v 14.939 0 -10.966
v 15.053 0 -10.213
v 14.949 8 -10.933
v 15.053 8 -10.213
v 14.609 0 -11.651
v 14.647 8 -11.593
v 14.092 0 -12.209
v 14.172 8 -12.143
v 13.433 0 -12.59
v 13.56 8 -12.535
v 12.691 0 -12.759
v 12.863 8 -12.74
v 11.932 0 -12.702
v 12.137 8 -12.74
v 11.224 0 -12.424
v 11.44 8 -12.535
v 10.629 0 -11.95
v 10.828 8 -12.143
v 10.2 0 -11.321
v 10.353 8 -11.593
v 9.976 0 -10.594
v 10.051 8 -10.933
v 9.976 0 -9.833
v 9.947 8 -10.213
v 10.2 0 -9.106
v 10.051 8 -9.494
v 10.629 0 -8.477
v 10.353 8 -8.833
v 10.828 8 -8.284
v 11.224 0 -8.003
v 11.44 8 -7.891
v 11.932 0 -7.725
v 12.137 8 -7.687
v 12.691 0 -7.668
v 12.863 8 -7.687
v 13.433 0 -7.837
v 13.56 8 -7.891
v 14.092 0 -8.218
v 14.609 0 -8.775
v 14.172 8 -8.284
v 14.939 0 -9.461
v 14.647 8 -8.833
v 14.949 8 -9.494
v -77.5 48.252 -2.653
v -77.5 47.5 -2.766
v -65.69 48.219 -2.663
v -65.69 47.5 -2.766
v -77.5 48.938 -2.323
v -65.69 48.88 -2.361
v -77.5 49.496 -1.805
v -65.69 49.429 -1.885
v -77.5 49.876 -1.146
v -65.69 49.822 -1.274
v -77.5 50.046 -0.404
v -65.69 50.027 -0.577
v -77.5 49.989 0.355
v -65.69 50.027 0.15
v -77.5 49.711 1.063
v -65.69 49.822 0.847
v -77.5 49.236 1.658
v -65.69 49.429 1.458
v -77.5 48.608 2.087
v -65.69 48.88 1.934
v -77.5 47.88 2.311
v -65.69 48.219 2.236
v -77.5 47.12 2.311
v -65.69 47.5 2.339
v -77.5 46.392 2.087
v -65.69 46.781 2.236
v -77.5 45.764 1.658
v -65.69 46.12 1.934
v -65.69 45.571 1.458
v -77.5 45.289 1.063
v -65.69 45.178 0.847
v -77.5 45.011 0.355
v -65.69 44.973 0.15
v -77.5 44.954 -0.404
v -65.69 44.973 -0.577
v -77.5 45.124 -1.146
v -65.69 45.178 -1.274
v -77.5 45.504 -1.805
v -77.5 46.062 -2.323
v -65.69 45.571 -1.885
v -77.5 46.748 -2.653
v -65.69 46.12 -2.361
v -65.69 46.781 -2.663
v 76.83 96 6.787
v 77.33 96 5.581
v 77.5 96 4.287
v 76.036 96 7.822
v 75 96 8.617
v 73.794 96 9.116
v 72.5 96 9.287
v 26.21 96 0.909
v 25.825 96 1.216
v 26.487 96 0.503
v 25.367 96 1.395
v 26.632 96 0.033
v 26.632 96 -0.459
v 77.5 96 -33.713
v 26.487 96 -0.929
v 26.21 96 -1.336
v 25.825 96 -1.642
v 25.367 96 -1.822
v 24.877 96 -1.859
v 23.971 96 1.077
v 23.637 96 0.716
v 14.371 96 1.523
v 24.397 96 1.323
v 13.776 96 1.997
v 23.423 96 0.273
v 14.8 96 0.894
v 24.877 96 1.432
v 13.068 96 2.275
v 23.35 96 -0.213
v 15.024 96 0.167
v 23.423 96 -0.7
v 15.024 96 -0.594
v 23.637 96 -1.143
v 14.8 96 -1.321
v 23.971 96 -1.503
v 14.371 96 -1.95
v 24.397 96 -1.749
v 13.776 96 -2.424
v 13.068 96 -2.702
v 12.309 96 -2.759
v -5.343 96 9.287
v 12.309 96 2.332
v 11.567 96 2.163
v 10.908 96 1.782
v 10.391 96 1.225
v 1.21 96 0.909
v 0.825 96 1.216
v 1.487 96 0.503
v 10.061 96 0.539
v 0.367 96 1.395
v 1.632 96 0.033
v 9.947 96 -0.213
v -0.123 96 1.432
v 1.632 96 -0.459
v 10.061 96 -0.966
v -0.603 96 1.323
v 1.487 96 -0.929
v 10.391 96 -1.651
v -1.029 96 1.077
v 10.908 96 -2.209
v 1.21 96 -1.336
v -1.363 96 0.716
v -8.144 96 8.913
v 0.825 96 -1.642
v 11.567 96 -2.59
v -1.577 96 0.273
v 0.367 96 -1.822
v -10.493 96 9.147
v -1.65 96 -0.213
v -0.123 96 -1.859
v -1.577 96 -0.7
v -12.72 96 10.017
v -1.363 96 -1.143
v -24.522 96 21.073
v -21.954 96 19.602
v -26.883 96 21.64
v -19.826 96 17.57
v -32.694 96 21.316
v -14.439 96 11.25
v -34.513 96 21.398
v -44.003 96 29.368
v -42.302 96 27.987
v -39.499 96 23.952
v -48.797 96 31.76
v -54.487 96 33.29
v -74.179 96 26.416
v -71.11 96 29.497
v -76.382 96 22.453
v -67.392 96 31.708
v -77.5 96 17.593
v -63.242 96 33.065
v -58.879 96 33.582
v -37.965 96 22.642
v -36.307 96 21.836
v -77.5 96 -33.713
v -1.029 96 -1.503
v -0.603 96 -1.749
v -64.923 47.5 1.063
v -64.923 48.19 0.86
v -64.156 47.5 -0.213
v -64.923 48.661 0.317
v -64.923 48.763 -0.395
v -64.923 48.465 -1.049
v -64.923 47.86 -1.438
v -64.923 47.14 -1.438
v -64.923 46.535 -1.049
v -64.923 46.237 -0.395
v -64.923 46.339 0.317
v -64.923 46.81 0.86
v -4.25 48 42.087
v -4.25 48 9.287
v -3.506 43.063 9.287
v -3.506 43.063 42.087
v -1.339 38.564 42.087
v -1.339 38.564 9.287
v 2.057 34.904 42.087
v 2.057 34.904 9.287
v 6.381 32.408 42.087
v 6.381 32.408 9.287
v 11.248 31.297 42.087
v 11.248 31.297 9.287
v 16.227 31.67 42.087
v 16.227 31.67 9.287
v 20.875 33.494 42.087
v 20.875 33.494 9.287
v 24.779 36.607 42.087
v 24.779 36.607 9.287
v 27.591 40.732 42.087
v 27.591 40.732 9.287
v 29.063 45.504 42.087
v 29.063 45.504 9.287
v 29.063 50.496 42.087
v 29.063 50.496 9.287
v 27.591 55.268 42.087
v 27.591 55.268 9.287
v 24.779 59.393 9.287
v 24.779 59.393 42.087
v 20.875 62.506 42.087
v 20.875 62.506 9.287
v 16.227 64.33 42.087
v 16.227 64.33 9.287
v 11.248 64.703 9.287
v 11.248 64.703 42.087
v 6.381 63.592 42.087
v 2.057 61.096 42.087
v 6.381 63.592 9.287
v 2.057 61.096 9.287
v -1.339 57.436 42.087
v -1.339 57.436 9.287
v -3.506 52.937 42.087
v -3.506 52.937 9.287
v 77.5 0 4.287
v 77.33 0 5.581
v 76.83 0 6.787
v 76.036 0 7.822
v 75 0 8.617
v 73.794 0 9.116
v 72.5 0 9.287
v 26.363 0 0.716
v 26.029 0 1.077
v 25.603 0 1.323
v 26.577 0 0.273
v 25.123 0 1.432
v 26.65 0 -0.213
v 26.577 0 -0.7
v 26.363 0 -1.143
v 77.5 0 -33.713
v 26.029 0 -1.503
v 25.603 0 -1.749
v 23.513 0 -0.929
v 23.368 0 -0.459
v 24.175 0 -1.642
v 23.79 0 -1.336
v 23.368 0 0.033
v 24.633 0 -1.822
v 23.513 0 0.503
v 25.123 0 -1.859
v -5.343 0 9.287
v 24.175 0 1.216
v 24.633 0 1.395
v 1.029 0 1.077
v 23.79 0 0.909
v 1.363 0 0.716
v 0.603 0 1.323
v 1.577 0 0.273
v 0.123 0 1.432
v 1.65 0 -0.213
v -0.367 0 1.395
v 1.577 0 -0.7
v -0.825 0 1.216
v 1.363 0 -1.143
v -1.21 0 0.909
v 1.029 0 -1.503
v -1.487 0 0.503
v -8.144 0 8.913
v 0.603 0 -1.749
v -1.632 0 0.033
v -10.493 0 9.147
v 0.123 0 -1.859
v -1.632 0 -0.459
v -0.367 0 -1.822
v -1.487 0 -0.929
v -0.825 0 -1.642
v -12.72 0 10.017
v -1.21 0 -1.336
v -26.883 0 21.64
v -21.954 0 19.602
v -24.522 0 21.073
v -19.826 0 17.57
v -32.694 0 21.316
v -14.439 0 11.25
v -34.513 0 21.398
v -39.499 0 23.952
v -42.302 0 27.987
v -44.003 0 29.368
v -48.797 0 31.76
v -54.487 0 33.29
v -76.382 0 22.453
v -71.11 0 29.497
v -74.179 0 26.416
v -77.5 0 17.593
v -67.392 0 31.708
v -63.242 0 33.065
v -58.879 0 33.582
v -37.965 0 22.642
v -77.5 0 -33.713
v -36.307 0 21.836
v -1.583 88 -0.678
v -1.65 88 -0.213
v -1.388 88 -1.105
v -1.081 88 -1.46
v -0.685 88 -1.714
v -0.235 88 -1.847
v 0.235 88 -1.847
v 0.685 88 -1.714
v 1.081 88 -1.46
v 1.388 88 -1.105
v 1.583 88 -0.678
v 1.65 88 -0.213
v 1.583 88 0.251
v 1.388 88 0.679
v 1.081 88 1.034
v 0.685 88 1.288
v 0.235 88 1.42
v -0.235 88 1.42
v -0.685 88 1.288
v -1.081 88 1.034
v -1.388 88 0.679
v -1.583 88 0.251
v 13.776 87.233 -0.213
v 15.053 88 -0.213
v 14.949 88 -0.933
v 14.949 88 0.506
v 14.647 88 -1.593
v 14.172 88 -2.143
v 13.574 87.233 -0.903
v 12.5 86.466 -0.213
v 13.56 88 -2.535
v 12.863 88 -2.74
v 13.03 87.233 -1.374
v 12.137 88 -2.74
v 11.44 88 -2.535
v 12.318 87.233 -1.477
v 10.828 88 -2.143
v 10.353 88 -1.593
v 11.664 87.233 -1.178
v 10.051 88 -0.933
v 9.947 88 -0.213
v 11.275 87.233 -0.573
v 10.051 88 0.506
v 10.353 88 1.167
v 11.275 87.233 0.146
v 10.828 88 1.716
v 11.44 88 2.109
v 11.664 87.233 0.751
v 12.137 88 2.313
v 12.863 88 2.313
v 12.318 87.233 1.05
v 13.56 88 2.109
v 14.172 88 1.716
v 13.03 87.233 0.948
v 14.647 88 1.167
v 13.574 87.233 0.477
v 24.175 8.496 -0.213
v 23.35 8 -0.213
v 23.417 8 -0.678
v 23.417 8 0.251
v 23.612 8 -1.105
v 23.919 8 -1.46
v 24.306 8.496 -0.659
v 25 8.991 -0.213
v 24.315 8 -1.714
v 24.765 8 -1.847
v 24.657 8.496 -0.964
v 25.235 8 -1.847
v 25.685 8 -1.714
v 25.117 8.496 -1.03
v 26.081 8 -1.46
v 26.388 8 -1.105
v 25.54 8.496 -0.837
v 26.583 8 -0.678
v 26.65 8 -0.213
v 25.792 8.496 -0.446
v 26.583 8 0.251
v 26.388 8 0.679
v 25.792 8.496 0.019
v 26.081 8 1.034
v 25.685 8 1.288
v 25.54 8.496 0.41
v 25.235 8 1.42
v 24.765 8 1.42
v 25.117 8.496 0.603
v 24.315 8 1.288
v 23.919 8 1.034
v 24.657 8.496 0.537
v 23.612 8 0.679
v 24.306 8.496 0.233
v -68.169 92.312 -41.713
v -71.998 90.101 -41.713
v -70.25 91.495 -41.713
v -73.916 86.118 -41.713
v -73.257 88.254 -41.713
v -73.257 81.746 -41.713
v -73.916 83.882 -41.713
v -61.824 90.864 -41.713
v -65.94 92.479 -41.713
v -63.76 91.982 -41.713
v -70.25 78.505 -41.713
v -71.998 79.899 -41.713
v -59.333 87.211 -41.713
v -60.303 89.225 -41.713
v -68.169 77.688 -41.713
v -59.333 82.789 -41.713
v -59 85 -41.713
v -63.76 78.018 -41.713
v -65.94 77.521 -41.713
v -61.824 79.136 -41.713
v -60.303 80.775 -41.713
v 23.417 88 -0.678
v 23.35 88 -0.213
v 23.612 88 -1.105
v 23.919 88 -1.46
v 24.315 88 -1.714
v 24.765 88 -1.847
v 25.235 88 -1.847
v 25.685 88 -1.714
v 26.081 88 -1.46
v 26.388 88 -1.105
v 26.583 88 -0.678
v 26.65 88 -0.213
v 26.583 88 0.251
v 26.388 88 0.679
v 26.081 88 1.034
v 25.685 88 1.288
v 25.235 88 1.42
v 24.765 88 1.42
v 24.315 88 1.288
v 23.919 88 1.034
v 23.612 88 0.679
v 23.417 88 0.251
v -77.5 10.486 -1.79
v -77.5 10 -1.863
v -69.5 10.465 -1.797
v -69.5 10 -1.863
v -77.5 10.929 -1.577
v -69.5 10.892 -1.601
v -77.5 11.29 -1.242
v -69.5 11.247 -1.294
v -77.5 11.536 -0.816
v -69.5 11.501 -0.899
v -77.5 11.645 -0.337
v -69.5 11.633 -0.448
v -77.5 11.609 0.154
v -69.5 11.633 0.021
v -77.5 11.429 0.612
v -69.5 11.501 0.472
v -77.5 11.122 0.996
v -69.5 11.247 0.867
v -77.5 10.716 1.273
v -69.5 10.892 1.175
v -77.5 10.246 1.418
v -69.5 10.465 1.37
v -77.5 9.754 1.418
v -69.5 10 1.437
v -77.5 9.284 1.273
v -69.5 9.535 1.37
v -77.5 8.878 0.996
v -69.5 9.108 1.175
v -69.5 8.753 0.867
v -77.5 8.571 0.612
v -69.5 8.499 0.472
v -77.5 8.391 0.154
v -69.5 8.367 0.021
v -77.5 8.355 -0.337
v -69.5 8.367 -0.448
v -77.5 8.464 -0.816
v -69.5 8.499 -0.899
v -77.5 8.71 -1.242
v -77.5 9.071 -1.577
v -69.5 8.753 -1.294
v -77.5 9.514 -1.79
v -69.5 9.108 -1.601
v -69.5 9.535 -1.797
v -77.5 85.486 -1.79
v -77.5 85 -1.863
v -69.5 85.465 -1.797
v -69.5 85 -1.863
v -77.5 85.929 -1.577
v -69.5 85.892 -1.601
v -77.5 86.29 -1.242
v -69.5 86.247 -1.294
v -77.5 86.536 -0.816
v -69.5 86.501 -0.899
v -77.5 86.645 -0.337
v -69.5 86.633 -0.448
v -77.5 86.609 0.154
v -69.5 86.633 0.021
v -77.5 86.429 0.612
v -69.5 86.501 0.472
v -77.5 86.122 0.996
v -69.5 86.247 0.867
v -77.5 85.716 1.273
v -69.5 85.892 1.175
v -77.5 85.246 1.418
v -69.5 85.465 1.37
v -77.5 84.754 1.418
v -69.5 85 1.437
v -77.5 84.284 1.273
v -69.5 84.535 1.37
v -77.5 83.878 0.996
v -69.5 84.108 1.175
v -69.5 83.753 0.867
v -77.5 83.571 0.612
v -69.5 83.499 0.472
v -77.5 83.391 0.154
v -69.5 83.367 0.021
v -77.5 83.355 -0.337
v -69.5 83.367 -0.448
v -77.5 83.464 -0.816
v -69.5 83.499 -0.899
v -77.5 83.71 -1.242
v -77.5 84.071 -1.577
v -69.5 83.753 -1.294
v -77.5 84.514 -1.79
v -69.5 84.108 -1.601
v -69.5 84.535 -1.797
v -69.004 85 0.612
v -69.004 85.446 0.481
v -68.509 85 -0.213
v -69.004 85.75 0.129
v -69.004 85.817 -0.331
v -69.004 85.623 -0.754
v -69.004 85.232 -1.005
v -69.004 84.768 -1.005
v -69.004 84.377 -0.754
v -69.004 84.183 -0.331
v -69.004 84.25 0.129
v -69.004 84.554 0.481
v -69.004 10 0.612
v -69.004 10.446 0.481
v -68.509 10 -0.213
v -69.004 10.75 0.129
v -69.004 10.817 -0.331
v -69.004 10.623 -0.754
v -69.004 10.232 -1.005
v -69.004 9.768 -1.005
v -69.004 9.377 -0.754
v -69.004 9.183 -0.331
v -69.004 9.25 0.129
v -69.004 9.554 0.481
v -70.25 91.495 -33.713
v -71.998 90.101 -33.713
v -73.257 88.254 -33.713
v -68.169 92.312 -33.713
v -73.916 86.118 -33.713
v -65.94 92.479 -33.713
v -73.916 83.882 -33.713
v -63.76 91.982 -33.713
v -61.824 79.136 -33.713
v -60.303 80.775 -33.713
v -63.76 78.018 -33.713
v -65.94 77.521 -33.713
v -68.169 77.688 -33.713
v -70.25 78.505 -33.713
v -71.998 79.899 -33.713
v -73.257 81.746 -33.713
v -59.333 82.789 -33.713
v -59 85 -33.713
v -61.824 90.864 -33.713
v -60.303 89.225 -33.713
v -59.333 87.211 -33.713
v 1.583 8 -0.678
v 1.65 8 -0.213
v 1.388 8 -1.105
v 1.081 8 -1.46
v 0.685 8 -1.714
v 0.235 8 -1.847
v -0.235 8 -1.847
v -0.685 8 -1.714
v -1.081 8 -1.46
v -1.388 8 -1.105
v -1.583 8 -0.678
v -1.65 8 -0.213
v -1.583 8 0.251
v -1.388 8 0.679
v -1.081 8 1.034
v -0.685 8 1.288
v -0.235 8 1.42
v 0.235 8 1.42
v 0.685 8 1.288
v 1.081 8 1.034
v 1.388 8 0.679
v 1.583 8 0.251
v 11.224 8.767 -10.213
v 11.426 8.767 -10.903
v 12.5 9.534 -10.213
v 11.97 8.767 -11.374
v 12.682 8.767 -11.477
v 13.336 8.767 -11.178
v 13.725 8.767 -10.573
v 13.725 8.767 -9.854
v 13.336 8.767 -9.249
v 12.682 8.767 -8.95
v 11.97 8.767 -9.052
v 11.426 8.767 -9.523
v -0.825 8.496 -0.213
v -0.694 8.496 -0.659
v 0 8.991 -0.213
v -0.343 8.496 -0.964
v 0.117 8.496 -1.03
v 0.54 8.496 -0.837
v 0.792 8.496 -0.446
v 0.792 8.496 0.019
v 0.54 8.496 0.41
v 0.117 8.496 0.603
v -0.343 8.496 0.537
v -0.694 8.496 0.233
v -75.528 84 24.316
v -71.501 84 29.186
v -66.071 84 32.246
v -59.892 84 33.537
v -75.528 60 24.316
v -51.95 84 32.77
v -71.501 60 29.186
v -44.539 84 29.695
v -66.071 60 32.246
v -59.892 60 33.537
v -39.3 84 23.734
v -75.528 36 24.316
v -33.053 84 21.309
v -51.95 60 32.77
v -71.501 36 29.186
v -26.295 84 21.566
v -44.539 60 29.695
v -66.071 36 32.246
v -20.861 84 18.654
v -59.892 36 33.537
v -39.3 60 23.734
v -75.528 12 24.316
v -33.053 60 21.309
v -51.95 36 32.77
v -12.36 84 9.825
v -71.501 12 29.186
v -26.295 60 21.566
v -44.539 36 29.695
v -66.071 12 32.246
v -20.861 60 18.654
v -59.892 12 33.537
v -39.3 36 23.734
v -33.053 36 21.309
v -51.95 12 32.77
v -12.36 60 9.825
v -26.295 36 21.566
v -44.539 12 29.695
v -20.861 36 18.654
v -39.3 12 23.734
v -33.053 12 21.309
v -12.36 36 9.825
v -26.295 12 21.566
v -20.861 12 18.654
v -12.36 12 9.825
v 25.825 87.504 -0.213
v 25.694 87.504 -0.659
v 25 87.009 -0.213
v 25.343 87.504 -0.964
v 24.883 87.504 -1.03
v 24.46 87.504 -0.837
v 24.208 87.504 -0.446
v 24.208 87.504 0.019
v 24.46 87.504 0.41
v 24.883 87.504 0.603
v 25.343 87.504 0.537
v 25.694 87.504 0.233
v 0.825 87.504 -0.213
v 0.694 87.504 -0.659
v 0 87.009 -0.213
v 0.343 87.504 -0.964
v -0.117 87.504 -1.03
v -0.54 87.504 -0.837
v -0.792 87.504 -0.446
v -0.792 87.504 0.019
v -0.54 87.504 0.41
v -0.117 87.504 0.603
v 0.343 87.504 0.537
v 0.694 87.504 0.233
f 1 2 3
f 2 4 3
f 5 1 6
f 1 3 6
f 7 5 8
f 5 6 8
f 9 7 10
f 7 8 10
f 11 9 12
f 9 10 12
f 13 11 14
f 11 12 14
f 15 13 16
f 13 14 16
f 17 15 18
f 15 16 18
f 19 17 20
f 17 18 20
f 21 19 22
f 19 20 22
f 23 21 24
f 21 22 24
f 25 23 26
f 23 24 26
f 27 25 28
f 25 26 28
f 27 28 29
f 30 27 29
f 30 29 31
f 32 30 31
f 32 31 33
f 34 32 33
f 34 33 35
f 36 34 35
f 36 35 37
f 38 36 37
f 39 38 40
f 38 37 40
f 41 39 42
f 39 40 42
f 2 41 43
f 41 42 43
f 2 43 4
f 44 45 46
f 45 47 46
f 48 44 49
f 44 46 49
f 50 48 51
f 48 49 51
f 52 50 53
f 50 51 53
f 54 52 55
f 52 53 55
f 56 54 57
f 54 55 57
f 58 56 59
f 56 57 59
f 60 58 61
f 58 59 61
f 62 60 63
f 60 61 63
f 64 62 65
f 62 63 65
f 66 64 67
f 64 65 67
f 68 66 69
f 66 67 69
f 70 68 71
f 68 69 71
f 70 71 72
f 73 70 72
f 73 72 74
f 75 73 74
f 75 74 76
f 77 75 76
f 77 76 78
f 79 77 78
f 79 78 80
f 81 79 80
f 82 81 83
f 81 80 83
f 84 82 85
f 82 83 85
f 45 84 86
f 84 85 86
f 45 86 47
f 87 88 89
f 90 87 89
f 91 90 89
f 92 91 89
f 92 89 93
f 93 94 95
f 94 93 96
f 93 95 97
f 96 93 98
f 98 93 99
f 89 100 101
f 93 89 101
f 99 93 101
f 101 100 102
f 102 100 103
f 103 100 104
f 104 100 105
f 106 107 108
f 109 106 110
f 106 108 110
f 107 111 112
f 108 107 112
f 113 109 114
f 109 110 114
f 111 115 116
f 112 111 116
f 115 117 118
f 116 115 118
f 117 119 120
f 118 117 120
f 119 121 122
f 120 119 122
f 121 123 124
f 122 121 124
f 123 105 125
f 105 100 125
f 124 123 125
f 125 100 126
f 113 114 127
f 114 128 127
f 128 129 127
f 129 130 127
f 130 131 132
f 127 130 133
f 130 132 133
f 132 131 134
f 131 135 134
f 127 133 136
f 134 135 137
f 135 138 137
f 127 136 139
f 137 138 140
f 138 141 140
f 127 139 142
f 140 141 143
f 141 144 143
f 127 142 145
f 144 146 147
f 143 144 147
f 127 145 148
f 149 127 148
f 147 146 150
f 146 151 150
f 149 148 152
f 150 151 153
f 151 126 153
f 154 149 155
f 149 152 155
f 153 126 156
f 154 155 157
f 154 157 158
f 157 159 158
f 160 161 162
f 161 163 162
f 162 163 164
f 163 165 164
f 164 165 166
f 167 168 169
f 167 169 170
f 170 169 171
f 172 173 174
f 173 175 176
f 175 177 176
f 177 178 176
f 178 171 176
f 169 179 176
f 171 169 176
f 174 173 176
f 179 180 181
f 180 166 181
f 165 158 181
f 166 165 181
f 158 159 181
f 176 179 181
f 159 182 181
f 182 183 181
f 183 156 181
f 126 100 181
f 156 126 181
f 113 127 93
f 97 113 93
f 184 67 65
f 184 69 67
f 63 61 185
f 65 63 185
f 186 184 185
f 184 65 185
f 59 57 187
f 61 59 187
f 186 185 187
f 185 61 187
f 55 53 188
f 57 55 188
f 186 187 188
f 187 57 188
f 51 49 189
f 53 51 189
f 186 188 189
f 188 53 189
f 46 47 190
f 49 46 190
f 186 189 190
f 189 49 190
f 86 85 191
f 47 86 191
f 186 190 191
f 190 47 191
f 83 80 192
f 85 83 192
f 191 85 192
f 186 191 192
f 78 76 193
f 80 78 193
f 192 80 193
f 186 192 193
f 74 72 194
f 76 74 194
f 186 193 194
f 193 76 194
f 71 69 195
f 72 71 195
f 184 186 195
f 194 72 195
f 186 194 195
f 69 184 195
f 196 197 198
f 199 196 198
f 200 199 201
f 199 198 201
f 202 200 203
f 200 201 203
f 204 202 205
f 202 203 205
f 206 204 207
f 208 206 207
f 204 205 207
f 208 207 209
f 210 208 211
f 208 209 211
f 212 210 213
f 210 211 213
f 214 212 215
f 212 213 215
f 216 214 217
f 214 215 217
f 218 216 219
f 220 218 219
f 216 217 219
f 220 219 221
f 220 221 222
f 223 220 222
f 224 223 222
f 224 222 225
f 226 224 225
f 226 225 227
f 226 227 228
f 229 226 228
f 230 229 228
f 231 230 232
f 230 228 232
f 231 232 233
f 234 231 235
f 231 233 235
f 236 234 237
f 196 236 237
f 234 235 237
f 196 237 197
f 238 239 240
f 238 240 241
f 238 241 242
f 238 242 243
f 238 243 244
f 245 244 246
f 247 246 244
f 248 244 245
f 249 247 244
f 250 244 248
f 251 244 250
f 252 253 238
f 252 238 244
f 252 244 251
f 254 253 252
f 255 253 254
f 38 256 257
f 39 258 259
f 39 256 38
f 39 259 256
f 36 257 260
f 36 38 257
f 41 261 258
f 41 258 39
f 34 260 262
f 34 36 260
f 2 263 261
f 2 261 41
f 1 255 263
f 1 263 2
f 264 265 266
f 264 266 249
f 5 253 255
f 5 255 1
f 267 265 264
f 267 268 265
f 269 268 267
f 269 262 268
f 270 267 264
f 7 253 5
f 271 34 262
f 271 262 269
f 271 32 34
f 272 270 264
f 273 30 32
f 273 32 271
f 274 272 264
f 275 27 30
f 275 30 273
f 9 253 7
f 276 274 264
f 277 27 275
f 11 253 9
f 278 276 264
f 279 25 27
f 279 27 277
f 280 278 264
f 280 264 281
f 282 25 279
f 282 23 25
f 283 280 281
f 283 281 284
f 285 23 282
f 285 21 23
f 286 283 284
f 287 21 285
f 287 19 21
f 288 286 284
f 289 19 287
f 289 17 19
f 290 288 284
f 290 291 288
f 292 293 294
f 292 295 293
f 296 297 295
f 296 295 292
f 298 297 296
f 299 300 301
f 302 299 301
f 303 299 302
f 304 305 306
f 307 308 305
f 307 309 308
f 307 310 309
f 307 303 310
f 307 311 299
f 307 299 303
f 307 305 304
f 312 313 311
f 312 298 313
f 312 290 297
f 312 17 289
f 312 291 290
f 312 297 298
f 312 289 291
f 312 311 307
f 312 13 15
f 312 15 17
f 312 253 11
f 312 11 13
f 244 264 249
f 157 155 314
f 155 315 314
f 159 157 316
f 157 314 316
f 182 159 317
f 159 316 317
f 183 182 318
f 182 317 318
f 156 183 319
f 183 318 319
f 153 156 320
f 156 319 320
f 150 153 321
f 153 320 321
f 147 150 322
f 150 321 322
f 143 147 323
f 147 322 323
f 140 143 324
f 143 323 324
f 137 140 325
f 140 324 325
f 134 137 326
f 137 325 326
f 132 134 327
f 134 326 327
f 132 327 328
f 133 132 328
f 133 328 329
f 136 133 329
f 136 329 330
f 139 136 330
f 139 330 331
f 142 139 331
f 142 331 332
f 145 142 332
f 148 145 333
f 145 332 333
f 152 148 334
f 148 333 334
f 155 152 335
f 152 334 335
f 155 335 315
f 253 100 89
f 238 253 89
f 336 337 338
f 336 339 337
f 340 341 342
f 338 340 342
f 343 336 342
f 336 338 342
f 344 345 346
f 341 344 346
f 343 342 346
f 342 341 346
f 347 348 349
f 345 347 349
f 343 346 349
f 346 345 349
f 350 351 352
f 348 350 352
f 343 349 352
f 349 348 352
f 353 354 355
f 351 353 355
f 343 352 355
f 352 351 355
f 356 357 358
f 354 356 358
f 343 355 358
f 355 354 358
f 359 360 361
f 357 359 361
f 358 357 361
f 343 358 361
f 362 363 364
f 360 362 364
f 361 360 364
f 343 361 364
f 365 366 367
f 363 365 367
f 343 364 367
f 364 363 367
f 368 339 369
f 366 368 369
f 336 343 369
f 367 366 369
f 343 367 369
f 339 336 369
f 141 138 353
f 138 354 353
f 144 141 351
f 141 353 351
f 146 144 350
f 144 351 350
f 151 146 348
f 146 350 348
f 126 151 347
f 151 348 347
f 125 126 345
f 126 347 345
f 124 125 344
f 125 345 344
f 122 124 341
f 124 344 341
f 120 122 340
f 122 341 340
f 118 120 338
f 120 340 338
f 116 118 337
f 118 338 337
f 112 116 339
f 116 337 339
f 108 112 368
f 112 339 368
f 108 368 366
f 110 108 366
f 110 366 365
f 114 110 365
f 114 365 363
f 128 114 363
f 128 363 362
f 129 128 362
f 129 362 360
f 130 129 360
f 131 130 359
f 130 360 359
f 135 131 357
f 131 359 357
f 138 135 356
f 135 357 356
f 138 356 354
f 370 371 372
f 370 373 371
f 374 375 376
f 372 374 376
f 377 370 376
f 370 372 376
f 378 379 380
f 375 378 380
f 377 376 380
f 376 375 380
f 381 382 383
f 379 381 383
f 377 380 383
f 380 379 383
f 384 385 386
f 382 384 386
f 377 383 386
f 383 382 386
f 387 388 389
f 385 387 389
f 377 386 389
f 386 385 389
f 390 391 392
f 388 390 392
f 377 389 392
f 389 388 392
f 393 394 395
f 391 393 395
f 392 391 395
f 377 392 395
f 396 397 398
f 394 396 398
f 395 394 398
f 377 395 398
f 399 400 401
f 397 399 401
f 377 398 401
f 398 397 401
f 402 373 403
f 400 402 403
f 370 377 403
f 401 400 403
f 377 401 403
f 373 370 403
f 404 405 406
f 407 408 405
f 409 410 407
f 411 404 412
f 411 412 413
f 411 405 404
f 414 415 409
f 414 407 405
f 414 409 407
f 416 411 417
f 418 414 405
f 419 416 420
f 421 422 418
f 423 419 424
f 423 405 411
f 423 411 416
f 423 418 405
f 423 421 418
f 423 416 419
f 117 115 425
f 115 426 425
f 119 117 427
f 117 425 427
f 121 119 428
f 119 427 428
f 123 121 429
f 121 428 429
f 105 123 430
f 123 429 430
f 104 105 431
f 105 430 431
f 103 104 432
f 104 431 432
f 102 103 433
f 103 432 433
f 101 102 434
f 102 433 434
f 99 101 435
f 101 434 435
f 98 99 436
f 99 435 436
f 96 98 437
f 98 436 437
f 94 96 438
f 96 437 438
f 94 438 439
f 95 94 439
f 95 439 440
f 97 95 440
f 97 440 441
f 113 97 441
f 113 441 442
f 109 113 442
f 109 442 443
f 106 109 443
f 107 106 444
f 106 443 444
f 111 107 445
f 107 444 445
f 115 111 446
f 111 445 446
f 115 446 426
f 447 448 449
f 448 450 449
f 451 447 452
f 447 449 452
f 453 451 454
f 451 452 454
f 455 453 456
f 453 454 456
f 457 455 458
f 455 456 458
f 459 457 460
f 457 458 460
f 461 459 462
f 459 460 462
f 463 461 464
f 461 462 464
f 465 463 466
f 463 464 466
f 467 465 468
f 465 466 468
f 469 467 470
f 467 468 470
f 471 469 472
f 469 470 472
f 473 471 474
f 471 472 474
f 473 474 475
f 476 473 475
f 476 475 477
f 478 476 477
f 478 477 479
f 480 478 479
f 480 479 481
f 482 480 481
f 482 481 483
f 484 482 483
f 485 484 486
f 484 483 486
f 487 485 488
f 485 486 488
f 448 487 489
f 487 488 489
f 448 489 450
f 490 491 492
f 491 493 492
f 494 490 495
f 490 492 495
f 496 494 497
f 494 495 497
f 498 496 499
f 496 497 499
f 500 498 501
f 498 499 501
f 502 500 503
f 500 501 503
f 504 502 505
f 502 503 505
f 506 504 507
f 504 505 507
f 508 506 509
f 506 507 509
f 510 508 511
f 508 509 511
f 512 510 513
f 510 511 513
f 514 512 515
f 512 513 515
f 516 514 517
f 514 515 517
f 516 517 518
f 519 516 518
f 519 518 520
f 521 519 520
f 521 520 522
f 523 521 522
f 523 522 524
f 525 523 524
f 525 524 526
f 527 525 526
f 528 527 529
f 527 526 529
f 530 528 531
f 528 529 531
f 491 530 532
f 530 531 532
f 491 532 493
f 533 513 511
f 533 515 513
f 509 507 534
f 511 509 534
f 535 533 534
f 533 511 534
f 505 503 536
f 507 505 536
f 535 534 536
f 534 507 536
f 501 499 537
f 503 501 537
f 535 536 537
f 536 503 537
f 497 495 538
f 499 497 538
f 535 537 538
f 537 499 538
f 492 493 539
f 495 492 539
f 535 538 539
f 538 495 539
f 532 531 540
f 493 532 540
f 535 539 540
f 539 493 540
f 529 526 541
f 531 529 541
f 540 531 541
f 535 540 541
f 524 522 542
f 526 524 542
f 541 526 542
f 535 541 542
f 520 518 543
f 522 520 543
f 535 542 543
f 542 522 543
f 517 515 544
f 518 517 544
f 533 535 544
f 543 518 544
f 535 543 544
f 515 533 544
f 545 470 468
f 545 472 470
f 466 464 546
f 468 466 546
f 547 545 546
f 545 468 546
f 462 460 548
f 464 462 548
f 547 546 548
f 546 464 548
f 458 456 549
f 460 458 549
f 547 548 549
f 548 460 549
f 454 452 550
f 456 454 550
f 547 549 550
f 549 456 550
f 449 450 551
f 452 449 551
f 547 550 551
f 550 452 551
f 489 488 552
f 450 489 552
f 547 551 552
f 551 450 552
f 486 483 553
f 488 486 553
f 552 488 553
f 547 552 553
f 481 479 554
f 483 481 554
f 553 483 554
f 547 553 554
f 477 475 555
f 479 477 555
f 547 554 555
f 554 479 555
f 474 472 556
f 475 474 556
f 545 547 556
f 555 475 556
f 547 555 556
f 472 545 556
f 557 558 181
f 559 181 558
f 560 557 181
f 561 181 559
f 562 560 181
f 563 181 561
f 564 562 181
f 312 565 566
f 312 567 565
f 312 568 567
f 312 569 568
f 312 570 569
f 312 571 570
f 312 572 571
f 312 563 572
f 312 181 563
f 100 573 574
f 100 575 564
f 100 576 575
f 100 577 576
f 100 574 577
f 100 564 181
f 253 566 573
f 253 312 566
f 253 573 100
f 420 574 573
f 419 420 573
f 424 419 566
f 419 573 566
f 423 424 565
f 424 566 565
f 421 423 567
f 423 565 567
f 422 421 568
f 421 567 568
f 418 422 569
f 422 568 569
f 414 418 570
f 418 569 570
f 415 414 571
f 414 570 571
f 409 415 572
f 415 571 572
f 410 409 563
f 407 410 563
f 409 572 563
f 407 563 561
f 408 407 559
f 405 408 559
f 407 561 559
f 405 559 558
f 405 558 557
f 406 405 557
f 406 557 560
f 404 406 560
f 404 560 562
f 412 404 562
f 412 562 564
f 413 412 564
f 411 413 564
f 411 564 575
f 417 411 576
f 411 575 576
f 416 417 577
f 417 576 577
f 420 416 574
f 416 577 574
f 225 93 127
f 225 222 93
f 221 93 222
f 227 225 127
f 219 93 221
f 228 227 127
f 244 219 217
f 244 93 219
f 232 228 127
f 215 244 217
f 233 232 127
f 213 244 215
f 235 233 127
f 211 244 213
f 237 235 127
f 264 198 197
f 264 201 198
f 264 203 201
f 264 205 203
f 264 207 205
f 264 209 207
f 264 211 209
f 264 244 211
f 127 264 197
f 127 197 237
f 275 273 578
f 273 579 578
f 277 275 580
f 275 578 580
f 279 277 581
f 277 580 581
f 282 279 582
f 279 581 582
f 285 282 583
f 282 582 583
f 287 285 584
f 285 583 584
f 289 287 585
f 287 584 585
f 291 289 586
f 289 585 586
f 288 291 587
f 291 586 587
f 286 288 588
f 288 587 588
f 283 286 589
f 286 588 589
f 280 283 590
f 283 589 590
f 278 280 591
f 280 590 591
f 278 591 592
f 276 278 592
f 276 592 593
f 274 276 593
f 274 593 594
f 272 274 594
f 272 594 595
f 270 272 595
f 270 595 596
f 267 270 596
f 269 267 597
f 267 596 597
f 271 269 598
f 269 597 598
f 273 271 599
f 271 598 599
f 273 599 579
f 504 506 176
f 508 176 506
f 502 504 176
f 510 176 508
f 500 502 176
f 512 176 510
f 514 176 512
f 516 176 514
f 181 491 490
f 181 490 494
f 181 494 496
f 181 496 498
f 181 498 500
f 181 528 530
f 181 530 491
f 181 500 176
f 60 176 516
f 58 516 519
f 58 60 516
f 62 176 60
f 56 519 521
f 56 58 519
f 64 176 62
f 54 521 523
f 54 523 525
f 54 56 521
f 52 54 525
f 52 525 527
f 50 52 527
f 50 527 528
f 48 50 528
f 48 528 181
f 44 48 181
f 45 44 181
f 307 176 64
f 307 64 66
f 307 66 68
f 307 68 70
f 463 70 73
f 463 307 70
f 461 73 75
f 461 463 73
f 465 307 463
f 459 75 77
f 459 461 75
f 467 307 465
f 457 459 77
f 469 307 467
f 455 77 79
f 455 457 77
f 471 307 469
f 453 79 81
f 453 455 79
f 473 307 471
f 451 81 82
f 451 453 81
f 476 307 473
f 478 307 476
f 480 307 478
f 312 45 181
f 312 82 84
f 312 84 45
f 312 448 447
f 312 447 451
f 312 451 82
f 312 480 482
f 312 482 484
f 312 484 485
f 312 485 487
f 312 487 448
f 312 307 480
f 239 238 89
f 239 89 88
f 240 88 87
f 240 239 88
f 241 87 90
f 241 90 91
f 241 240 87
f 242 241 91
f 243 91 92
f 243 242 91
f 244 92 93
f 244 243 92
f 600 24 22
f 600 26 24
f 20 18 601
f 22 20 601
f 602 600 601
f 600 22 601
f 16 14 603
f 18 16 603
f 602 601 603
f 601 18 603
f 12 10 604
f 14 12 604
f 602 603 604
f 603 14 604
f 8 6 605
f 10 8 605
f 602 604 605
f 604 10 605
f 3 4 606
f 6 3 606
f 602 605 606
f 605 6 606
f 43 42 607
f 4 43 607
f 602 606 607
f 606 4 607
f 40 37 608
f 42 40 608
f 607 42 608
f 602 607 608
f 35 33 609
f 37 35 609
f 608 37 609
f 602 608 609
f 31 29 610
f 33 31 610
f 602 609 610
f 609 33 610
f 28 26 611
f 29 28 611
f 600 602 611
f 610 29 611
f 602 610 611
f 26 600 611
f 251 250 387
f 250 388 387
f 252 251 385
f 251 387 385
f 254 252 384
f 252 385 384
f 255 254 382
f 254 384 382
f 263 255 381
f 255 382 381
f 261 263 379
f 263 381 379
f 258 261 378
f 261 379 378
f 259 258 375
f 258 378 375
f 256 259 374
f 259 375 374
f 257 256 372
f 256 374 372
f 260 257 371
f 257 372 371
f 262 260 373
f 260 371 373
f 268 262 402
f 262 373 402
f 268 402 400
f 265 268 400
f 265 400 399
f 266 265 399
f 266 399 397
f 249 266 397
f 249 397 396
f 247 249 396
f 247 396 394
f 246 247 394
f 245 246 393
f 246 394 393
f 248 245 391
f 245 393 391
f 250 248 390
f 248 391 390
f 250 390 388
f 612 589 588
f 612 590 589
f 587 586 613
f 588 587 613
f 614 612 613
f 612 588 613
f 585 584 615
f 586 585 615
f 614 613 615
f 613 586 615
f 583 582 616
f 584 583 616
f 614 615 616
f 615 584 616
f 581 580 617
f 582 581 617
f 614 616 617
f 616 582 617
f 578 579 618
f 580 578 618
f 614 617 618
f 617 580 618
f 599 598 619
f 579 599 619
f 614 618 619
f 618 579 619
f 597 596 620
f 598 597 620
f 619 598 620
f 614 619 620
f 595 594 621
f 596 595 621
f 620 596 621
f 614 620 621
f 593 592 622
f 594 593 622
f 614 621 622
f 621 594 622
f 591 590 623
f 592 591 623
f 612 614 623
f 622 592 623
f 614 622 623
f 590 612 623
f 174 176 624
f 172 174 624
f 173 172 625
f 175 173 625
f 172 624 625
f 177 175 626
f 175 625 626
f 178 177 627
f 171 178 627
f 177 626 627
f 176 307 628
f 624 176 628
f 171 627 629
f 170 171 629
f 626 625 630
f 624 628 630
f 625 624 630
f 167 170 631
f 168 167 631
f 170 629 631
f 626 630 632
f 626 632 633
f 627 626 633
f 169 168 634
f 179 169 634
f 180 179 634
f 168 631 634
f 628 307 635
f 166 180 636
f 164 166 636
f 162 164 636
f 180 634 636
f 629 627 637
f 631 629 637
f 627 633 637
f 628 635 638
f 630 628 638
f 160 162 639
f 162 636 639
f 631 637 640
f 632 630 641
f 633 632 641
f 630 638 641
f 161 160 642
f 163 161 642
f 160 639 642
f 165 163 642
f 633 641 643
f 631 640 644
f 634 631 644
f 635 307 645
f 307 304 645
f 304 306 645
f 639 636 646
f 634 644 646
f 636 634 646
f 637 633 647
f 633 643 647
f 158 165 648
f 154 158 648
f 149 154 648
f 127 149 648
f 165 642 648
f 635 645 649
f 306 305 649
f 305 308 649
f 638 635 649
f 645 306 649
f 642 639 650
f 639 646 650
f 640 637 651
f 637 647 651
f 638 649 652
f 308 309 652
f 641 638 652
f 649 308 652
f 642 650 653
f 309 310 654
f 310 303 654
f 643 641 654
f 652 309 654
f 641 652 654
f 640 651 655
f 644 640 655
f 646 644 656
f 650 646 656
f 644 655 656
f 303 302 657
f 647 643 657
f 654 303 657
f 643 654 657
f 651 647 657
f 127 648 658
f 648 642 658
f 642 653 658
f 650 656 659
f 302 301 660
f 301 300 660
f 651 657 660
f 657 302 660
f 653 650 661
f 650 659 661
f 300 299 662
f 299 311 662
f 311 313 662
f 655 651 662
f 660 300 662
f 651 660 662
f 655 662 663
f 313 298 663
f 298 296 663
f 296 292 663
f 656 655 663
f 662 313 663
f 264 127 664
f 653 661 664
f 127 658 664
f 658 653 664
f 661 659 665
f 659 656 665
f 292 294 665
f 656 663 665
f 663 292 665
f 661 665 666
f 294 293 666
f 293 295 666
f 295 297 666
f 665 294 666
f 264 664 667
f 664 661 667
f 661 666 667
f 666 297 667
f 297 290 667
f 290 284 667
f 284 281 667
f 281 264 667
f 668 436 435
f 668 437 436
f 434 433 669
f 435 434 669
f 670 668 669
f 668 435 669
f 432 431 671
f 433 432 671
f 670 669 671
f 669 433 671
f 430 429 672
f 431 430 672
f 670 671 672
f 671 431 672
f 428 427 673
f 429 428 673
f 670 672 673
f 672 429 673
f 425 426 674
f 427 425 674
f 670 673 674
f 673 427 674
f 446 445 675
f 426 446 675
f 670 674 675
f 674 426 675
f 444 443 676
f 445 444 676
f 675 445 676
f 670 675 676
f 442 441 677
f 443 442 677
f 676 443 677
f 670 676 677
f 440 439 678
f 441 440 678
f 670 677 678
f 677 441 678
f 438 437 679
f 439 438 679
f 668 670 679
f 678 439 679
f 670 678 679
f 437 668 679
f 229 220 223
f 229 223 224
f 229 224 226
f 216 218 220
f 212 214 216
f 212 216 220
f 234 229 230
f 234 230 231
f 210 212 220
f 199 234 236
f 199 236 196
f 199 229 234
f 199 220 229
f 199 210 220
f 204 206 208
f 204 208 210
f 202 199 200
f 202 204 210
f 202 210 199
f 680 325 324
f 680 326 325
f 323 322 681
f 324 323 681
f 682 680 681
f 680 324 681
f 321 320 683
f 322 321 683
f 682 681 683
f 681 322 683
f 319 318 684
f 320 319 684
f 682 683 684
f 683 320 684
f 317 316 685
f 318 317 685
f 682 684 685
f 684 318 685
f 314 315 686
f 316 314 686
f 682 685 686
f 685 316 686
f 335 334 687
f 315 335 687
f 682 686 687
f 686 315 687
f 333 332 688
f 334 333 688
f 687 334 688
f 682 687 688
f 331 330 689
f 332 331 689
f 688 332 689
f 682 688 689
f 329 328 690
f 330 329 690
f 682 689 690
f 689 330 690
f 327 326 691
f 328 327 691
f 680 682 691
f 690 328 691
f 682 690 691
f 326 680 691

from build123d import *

# Parameters (mm, degrees)
BOSS_EXTRUDE2_DEPTH         = 96
F_1_4_20_TAPPED_HOLE1_D     = 5.1054
F_1_4_20_TAPPED_HOLE1_DEPTH = 11.81
F_1_4_20_TAPPED_HOLE1_TIP   = 1.533816902
M4X0_7_TAPPED_HOLE1_D       = 3.3
M4X0_7_TAPPED_HOLE1_DEPTH   = 8
M4X0_7_TAPPED_HOLE1_TIP     = 0.991420021
F_1_4_20_TAPPED_HOLE2_D     = 5.1054
F_1_4_20_TAPPED_HOLE2_DEPTH = 8
F_1_4_20_TAPPED_HOLE2_TIP   = 1.533816902
M4X0_7_TAPPED_HOLE2_D       = 3.3
M4X0_7_TAPPED_HOLE2_DEPTH   = 8
M4X0_7_TAPPED_HOLE2_TIP     = 0.991420021
F_1_4_20_TAPPED_HOLE3_D     = 5.1054
F_1_4_20_TAPPED_HOLE3_DEPTH = 8
F_1_4_20_TAPPED_HOLE3_TIP   = 1.533816902
M4X0_7_TAPPED_HOLE3_D       = 3.3
M4X0_7_TAPPED_HOLE3_DEPTH   = 8
M4X0_7_TAPPED_HOLE3_TIP     = 0.991420021
SKETCH18_R                  = 15
BOSS_EXTRUDE3_DEPTH         = 7
SKETCH19_R                  = 16.75
BOSS_EXTRUDE4_DEPTH         = 32.8
SKETCH21_R                  = 7.5
BOSS_EXTRUDE5_DEPTH         = 8


with BuildPart() as part:
    # Sketch3 → Boss-Extrude2 (new body)
    with BuildSketch(Plane(origin=(0, 0, 0), x_dir=(1, 0, 0), z_dir=(0, 1, 0))):
        with BuildLine():
            Line((-77.5, 33.713374541), (77.5, 33.713374541))
            Line((77.5, 33.713374541), (77.5, -4.286625459))
            ThreePointArc((77.5, -4.286625459), (76.035533906, -7.822159365), (72.5, -9.286625459))
            Line((72.5, -9.286625459), (-5.34280429, -9.286625459))
            add(Edge.make_bspline(
                [(-77.5, -17.592632334), (-76.531586921, -27.812364706), (-63.183365133, -36.225526643), (-48.309869967, -32.191560801), (-41.548221394, -27.791577279), (-39.923317307, -23.252890407), (-33.51659169, -20.402804079), (-27.636821931, -22.457279743), (-17.016494344, -17.99263357), (-15.451468691, -6.931628422), (-5.34280429, -9.286625459)],
                knots=[0, 0, 0, 0, 0.287416321, 0.468367966, 0.496457191, 0.560076213, 0.621962162, 0.714917343, 0.75940227, 1, 1, 1, 1], degree=3))
            Line((-77.5, -17.592632334), (-77.5, 33.713374541))
        make_face()
    extrude(amount=BOSS_EXTRUDE2_DEPTH)

    # 1/4-20 Tapped Hole1
    with Locations(Plane.ZY.offset(77.5)):
        with Locations((-0.213374541, 47.5)):
            Hole(F_1_4_20_TAPPED_HOLE1_D / 2, depth=F_1_4_20_TAPPED_HOLE1_DEPTH)
            with Locations((0, 0, -(F_1_4_20_TAPPED_HOLE1_DEPTH + F_1_4_20_TAPPED_HOLE1_TIP / 2))):  # 118° drill point
                Cone(0, F_1_4_20_TAPPED_HOLE1_D / 2, F_1_4_20_TAPPED_HOLE1_TIP, mode=Mode.SUBTRACT)

    # M4x0.7 Tapped Hole1
    with Locations(Plane.ZY.offset(77.5)):
        with Locations((-0.213374541, 85), (-0.213374541, 10)):
            Hole(M4X0_7_TAPPED_HOLE1_D / 2, depth=M4X0_7_TAPPED_HOLE1_DEPTH)
            with Locations((0, 0, -(M4X0_7_TAPPED_HOLE1_DEPTH + M4X0_7_TAPPED_HOLE1_TIP / 2))):  # 118° drill point
                Cone(0, M4X0_7_TAPPED_HOLE1_D / 2, M4X0_7_TAPPED_HOLE1_TIP, mode=Mode.SUBTRACT)

    # 1/4-20 Tapped Hole2
    with Locations(Plane(origin=(0, 0, 0), x_dir=(-1, 0, 0), z_dir=(0, -1, 0))):
        with Locations((-12.5, 10.213374541)):
            Hole(F_1_4_20_TAPPED_HOLE2_D / 2, depth=F_1_4_20_TAPPED_HOLE2_DEPTH)
            with Locations((0, 0, -(F_1_4_20_TAPPED_HOLE2_DEPTH + F_1_4_20_TAPPED_HOLE2_TIP / 2))):  # 118° drill point
                Cone(0, F_1_4_20_TAPPED_HOLE2_D / 2, F_1_4_20_TAPPED_HOLE2_TIP, mode=Mode.SUBTRACT)

    # M4x0.7 Tapped Hole2
    with Locations(Plane(origin=(0, 0, 0), x_dir=(-1, 0, 0), z_dir=(0, -1, 0))):
        with Locations((0, 0.213374541), (-25, 0.213374541)):
            Hole(M4X0_7_TAPPED_HOLE2_D / 2, depth=M4X0_7_TAPPED_HOLE2_DEPTH)
            with Locations((0, 0, -(M4X0_7_TAPPED_HOLE2_DEPTH + M4X0_7_TAPPED_HOLE2_TIP / 2))):  # 118° drill point
                Cone(0, M4X0_7_TAPPED_HOLE2_D / 2, M4X0_7_TAPPED_HOLE2_TIP, mode=Mode.SUBTRACT)

    # 1/4-20 Tapped Hole3
    with Locations(Plane(origin=(0, 96, 0), x_dir=(1, 0, 0), z_dir=(0, 1, 0))):
        with Locations((12.5, 0.213374541)):
            Hole(F_1_4_20_TAPPED_HOLE3_D / 2, depth=F_1_4_20_TAPPED_HOLE3_DEPTH)
            with Locations((0, 0, -(F_1_4_20_TAPPED_HOLE3_DEPTH + F_1_4_20_TAPPED_HOLE3_TIP / 2))):  # 118° drill point
                Cone(0, F_1_4_20_TAPPED_HOLE3_D / 2, F_1_4_20_TAPPED_HOLE3_TIP, mode=Mode.SUBTRACT)

    # M4x0.7 Tapped Hole3
    with Locations(Plane(origin=(0, 96, 0), x_dir=(1, 0, 0), z_dir=(0, 1, 0))):
        with Locations((25, 0.213374541), (0, 0.213374541)):
            Hole(M4X0_7_TAPPED_HOLE3_D / 2, depth=M4X0_7_TAPPED_HOLE3_DEPTH)
            with Locations((0, 0, -(M4X0_7_TAPPED_HOLE3_DEPTH + M4X0_7_TAPPED_HOLE3_TIP / 2))):  # 118° drill point
                Cone(0, M4X0_7_TAPPED_HOLE3_D / 2, M4X0_7_TAPPED_HOLE3_TIP, mode=Mode.SUBTRACT)

    # Sketch18 → Boss-Extrude3 (add)
    with BuildSketch(Plane.XY.offset(9.286625459)):
        with Locations(Location((12.5, 48, 0), (0, 0, 180))):
            Circle(SKETCH18_R)
    extrude(amount=BOSS_EXTRUDE3_DEPTH)

    # Sketch19 → Boss-Extrude4 (add)
    with BuildSketch(Plane.XY.offset(9.286625459)):
        with Locations(Location((12.5, 48, 0), (0, 0, 180))):
            Circle(SKETCH19_R)
    extrude(amount=BOSS_EXTRUDE4_DEPTH)

    # Sketch21 → Boss-Extrude5 (add)
    with BuildSketch(Plane(origin=(0, 0, -33.713374541), x_dir=(-1, 0, 0), z_dir=(0, 0, -1))):
        with Locations(Location((66.5, 85, 0), (0, 0, 180))):
            Circle(SKETCH21_R)
    extrude(amount=BOSS_EXTRUDE5_DEPTH)


solid = part.part
